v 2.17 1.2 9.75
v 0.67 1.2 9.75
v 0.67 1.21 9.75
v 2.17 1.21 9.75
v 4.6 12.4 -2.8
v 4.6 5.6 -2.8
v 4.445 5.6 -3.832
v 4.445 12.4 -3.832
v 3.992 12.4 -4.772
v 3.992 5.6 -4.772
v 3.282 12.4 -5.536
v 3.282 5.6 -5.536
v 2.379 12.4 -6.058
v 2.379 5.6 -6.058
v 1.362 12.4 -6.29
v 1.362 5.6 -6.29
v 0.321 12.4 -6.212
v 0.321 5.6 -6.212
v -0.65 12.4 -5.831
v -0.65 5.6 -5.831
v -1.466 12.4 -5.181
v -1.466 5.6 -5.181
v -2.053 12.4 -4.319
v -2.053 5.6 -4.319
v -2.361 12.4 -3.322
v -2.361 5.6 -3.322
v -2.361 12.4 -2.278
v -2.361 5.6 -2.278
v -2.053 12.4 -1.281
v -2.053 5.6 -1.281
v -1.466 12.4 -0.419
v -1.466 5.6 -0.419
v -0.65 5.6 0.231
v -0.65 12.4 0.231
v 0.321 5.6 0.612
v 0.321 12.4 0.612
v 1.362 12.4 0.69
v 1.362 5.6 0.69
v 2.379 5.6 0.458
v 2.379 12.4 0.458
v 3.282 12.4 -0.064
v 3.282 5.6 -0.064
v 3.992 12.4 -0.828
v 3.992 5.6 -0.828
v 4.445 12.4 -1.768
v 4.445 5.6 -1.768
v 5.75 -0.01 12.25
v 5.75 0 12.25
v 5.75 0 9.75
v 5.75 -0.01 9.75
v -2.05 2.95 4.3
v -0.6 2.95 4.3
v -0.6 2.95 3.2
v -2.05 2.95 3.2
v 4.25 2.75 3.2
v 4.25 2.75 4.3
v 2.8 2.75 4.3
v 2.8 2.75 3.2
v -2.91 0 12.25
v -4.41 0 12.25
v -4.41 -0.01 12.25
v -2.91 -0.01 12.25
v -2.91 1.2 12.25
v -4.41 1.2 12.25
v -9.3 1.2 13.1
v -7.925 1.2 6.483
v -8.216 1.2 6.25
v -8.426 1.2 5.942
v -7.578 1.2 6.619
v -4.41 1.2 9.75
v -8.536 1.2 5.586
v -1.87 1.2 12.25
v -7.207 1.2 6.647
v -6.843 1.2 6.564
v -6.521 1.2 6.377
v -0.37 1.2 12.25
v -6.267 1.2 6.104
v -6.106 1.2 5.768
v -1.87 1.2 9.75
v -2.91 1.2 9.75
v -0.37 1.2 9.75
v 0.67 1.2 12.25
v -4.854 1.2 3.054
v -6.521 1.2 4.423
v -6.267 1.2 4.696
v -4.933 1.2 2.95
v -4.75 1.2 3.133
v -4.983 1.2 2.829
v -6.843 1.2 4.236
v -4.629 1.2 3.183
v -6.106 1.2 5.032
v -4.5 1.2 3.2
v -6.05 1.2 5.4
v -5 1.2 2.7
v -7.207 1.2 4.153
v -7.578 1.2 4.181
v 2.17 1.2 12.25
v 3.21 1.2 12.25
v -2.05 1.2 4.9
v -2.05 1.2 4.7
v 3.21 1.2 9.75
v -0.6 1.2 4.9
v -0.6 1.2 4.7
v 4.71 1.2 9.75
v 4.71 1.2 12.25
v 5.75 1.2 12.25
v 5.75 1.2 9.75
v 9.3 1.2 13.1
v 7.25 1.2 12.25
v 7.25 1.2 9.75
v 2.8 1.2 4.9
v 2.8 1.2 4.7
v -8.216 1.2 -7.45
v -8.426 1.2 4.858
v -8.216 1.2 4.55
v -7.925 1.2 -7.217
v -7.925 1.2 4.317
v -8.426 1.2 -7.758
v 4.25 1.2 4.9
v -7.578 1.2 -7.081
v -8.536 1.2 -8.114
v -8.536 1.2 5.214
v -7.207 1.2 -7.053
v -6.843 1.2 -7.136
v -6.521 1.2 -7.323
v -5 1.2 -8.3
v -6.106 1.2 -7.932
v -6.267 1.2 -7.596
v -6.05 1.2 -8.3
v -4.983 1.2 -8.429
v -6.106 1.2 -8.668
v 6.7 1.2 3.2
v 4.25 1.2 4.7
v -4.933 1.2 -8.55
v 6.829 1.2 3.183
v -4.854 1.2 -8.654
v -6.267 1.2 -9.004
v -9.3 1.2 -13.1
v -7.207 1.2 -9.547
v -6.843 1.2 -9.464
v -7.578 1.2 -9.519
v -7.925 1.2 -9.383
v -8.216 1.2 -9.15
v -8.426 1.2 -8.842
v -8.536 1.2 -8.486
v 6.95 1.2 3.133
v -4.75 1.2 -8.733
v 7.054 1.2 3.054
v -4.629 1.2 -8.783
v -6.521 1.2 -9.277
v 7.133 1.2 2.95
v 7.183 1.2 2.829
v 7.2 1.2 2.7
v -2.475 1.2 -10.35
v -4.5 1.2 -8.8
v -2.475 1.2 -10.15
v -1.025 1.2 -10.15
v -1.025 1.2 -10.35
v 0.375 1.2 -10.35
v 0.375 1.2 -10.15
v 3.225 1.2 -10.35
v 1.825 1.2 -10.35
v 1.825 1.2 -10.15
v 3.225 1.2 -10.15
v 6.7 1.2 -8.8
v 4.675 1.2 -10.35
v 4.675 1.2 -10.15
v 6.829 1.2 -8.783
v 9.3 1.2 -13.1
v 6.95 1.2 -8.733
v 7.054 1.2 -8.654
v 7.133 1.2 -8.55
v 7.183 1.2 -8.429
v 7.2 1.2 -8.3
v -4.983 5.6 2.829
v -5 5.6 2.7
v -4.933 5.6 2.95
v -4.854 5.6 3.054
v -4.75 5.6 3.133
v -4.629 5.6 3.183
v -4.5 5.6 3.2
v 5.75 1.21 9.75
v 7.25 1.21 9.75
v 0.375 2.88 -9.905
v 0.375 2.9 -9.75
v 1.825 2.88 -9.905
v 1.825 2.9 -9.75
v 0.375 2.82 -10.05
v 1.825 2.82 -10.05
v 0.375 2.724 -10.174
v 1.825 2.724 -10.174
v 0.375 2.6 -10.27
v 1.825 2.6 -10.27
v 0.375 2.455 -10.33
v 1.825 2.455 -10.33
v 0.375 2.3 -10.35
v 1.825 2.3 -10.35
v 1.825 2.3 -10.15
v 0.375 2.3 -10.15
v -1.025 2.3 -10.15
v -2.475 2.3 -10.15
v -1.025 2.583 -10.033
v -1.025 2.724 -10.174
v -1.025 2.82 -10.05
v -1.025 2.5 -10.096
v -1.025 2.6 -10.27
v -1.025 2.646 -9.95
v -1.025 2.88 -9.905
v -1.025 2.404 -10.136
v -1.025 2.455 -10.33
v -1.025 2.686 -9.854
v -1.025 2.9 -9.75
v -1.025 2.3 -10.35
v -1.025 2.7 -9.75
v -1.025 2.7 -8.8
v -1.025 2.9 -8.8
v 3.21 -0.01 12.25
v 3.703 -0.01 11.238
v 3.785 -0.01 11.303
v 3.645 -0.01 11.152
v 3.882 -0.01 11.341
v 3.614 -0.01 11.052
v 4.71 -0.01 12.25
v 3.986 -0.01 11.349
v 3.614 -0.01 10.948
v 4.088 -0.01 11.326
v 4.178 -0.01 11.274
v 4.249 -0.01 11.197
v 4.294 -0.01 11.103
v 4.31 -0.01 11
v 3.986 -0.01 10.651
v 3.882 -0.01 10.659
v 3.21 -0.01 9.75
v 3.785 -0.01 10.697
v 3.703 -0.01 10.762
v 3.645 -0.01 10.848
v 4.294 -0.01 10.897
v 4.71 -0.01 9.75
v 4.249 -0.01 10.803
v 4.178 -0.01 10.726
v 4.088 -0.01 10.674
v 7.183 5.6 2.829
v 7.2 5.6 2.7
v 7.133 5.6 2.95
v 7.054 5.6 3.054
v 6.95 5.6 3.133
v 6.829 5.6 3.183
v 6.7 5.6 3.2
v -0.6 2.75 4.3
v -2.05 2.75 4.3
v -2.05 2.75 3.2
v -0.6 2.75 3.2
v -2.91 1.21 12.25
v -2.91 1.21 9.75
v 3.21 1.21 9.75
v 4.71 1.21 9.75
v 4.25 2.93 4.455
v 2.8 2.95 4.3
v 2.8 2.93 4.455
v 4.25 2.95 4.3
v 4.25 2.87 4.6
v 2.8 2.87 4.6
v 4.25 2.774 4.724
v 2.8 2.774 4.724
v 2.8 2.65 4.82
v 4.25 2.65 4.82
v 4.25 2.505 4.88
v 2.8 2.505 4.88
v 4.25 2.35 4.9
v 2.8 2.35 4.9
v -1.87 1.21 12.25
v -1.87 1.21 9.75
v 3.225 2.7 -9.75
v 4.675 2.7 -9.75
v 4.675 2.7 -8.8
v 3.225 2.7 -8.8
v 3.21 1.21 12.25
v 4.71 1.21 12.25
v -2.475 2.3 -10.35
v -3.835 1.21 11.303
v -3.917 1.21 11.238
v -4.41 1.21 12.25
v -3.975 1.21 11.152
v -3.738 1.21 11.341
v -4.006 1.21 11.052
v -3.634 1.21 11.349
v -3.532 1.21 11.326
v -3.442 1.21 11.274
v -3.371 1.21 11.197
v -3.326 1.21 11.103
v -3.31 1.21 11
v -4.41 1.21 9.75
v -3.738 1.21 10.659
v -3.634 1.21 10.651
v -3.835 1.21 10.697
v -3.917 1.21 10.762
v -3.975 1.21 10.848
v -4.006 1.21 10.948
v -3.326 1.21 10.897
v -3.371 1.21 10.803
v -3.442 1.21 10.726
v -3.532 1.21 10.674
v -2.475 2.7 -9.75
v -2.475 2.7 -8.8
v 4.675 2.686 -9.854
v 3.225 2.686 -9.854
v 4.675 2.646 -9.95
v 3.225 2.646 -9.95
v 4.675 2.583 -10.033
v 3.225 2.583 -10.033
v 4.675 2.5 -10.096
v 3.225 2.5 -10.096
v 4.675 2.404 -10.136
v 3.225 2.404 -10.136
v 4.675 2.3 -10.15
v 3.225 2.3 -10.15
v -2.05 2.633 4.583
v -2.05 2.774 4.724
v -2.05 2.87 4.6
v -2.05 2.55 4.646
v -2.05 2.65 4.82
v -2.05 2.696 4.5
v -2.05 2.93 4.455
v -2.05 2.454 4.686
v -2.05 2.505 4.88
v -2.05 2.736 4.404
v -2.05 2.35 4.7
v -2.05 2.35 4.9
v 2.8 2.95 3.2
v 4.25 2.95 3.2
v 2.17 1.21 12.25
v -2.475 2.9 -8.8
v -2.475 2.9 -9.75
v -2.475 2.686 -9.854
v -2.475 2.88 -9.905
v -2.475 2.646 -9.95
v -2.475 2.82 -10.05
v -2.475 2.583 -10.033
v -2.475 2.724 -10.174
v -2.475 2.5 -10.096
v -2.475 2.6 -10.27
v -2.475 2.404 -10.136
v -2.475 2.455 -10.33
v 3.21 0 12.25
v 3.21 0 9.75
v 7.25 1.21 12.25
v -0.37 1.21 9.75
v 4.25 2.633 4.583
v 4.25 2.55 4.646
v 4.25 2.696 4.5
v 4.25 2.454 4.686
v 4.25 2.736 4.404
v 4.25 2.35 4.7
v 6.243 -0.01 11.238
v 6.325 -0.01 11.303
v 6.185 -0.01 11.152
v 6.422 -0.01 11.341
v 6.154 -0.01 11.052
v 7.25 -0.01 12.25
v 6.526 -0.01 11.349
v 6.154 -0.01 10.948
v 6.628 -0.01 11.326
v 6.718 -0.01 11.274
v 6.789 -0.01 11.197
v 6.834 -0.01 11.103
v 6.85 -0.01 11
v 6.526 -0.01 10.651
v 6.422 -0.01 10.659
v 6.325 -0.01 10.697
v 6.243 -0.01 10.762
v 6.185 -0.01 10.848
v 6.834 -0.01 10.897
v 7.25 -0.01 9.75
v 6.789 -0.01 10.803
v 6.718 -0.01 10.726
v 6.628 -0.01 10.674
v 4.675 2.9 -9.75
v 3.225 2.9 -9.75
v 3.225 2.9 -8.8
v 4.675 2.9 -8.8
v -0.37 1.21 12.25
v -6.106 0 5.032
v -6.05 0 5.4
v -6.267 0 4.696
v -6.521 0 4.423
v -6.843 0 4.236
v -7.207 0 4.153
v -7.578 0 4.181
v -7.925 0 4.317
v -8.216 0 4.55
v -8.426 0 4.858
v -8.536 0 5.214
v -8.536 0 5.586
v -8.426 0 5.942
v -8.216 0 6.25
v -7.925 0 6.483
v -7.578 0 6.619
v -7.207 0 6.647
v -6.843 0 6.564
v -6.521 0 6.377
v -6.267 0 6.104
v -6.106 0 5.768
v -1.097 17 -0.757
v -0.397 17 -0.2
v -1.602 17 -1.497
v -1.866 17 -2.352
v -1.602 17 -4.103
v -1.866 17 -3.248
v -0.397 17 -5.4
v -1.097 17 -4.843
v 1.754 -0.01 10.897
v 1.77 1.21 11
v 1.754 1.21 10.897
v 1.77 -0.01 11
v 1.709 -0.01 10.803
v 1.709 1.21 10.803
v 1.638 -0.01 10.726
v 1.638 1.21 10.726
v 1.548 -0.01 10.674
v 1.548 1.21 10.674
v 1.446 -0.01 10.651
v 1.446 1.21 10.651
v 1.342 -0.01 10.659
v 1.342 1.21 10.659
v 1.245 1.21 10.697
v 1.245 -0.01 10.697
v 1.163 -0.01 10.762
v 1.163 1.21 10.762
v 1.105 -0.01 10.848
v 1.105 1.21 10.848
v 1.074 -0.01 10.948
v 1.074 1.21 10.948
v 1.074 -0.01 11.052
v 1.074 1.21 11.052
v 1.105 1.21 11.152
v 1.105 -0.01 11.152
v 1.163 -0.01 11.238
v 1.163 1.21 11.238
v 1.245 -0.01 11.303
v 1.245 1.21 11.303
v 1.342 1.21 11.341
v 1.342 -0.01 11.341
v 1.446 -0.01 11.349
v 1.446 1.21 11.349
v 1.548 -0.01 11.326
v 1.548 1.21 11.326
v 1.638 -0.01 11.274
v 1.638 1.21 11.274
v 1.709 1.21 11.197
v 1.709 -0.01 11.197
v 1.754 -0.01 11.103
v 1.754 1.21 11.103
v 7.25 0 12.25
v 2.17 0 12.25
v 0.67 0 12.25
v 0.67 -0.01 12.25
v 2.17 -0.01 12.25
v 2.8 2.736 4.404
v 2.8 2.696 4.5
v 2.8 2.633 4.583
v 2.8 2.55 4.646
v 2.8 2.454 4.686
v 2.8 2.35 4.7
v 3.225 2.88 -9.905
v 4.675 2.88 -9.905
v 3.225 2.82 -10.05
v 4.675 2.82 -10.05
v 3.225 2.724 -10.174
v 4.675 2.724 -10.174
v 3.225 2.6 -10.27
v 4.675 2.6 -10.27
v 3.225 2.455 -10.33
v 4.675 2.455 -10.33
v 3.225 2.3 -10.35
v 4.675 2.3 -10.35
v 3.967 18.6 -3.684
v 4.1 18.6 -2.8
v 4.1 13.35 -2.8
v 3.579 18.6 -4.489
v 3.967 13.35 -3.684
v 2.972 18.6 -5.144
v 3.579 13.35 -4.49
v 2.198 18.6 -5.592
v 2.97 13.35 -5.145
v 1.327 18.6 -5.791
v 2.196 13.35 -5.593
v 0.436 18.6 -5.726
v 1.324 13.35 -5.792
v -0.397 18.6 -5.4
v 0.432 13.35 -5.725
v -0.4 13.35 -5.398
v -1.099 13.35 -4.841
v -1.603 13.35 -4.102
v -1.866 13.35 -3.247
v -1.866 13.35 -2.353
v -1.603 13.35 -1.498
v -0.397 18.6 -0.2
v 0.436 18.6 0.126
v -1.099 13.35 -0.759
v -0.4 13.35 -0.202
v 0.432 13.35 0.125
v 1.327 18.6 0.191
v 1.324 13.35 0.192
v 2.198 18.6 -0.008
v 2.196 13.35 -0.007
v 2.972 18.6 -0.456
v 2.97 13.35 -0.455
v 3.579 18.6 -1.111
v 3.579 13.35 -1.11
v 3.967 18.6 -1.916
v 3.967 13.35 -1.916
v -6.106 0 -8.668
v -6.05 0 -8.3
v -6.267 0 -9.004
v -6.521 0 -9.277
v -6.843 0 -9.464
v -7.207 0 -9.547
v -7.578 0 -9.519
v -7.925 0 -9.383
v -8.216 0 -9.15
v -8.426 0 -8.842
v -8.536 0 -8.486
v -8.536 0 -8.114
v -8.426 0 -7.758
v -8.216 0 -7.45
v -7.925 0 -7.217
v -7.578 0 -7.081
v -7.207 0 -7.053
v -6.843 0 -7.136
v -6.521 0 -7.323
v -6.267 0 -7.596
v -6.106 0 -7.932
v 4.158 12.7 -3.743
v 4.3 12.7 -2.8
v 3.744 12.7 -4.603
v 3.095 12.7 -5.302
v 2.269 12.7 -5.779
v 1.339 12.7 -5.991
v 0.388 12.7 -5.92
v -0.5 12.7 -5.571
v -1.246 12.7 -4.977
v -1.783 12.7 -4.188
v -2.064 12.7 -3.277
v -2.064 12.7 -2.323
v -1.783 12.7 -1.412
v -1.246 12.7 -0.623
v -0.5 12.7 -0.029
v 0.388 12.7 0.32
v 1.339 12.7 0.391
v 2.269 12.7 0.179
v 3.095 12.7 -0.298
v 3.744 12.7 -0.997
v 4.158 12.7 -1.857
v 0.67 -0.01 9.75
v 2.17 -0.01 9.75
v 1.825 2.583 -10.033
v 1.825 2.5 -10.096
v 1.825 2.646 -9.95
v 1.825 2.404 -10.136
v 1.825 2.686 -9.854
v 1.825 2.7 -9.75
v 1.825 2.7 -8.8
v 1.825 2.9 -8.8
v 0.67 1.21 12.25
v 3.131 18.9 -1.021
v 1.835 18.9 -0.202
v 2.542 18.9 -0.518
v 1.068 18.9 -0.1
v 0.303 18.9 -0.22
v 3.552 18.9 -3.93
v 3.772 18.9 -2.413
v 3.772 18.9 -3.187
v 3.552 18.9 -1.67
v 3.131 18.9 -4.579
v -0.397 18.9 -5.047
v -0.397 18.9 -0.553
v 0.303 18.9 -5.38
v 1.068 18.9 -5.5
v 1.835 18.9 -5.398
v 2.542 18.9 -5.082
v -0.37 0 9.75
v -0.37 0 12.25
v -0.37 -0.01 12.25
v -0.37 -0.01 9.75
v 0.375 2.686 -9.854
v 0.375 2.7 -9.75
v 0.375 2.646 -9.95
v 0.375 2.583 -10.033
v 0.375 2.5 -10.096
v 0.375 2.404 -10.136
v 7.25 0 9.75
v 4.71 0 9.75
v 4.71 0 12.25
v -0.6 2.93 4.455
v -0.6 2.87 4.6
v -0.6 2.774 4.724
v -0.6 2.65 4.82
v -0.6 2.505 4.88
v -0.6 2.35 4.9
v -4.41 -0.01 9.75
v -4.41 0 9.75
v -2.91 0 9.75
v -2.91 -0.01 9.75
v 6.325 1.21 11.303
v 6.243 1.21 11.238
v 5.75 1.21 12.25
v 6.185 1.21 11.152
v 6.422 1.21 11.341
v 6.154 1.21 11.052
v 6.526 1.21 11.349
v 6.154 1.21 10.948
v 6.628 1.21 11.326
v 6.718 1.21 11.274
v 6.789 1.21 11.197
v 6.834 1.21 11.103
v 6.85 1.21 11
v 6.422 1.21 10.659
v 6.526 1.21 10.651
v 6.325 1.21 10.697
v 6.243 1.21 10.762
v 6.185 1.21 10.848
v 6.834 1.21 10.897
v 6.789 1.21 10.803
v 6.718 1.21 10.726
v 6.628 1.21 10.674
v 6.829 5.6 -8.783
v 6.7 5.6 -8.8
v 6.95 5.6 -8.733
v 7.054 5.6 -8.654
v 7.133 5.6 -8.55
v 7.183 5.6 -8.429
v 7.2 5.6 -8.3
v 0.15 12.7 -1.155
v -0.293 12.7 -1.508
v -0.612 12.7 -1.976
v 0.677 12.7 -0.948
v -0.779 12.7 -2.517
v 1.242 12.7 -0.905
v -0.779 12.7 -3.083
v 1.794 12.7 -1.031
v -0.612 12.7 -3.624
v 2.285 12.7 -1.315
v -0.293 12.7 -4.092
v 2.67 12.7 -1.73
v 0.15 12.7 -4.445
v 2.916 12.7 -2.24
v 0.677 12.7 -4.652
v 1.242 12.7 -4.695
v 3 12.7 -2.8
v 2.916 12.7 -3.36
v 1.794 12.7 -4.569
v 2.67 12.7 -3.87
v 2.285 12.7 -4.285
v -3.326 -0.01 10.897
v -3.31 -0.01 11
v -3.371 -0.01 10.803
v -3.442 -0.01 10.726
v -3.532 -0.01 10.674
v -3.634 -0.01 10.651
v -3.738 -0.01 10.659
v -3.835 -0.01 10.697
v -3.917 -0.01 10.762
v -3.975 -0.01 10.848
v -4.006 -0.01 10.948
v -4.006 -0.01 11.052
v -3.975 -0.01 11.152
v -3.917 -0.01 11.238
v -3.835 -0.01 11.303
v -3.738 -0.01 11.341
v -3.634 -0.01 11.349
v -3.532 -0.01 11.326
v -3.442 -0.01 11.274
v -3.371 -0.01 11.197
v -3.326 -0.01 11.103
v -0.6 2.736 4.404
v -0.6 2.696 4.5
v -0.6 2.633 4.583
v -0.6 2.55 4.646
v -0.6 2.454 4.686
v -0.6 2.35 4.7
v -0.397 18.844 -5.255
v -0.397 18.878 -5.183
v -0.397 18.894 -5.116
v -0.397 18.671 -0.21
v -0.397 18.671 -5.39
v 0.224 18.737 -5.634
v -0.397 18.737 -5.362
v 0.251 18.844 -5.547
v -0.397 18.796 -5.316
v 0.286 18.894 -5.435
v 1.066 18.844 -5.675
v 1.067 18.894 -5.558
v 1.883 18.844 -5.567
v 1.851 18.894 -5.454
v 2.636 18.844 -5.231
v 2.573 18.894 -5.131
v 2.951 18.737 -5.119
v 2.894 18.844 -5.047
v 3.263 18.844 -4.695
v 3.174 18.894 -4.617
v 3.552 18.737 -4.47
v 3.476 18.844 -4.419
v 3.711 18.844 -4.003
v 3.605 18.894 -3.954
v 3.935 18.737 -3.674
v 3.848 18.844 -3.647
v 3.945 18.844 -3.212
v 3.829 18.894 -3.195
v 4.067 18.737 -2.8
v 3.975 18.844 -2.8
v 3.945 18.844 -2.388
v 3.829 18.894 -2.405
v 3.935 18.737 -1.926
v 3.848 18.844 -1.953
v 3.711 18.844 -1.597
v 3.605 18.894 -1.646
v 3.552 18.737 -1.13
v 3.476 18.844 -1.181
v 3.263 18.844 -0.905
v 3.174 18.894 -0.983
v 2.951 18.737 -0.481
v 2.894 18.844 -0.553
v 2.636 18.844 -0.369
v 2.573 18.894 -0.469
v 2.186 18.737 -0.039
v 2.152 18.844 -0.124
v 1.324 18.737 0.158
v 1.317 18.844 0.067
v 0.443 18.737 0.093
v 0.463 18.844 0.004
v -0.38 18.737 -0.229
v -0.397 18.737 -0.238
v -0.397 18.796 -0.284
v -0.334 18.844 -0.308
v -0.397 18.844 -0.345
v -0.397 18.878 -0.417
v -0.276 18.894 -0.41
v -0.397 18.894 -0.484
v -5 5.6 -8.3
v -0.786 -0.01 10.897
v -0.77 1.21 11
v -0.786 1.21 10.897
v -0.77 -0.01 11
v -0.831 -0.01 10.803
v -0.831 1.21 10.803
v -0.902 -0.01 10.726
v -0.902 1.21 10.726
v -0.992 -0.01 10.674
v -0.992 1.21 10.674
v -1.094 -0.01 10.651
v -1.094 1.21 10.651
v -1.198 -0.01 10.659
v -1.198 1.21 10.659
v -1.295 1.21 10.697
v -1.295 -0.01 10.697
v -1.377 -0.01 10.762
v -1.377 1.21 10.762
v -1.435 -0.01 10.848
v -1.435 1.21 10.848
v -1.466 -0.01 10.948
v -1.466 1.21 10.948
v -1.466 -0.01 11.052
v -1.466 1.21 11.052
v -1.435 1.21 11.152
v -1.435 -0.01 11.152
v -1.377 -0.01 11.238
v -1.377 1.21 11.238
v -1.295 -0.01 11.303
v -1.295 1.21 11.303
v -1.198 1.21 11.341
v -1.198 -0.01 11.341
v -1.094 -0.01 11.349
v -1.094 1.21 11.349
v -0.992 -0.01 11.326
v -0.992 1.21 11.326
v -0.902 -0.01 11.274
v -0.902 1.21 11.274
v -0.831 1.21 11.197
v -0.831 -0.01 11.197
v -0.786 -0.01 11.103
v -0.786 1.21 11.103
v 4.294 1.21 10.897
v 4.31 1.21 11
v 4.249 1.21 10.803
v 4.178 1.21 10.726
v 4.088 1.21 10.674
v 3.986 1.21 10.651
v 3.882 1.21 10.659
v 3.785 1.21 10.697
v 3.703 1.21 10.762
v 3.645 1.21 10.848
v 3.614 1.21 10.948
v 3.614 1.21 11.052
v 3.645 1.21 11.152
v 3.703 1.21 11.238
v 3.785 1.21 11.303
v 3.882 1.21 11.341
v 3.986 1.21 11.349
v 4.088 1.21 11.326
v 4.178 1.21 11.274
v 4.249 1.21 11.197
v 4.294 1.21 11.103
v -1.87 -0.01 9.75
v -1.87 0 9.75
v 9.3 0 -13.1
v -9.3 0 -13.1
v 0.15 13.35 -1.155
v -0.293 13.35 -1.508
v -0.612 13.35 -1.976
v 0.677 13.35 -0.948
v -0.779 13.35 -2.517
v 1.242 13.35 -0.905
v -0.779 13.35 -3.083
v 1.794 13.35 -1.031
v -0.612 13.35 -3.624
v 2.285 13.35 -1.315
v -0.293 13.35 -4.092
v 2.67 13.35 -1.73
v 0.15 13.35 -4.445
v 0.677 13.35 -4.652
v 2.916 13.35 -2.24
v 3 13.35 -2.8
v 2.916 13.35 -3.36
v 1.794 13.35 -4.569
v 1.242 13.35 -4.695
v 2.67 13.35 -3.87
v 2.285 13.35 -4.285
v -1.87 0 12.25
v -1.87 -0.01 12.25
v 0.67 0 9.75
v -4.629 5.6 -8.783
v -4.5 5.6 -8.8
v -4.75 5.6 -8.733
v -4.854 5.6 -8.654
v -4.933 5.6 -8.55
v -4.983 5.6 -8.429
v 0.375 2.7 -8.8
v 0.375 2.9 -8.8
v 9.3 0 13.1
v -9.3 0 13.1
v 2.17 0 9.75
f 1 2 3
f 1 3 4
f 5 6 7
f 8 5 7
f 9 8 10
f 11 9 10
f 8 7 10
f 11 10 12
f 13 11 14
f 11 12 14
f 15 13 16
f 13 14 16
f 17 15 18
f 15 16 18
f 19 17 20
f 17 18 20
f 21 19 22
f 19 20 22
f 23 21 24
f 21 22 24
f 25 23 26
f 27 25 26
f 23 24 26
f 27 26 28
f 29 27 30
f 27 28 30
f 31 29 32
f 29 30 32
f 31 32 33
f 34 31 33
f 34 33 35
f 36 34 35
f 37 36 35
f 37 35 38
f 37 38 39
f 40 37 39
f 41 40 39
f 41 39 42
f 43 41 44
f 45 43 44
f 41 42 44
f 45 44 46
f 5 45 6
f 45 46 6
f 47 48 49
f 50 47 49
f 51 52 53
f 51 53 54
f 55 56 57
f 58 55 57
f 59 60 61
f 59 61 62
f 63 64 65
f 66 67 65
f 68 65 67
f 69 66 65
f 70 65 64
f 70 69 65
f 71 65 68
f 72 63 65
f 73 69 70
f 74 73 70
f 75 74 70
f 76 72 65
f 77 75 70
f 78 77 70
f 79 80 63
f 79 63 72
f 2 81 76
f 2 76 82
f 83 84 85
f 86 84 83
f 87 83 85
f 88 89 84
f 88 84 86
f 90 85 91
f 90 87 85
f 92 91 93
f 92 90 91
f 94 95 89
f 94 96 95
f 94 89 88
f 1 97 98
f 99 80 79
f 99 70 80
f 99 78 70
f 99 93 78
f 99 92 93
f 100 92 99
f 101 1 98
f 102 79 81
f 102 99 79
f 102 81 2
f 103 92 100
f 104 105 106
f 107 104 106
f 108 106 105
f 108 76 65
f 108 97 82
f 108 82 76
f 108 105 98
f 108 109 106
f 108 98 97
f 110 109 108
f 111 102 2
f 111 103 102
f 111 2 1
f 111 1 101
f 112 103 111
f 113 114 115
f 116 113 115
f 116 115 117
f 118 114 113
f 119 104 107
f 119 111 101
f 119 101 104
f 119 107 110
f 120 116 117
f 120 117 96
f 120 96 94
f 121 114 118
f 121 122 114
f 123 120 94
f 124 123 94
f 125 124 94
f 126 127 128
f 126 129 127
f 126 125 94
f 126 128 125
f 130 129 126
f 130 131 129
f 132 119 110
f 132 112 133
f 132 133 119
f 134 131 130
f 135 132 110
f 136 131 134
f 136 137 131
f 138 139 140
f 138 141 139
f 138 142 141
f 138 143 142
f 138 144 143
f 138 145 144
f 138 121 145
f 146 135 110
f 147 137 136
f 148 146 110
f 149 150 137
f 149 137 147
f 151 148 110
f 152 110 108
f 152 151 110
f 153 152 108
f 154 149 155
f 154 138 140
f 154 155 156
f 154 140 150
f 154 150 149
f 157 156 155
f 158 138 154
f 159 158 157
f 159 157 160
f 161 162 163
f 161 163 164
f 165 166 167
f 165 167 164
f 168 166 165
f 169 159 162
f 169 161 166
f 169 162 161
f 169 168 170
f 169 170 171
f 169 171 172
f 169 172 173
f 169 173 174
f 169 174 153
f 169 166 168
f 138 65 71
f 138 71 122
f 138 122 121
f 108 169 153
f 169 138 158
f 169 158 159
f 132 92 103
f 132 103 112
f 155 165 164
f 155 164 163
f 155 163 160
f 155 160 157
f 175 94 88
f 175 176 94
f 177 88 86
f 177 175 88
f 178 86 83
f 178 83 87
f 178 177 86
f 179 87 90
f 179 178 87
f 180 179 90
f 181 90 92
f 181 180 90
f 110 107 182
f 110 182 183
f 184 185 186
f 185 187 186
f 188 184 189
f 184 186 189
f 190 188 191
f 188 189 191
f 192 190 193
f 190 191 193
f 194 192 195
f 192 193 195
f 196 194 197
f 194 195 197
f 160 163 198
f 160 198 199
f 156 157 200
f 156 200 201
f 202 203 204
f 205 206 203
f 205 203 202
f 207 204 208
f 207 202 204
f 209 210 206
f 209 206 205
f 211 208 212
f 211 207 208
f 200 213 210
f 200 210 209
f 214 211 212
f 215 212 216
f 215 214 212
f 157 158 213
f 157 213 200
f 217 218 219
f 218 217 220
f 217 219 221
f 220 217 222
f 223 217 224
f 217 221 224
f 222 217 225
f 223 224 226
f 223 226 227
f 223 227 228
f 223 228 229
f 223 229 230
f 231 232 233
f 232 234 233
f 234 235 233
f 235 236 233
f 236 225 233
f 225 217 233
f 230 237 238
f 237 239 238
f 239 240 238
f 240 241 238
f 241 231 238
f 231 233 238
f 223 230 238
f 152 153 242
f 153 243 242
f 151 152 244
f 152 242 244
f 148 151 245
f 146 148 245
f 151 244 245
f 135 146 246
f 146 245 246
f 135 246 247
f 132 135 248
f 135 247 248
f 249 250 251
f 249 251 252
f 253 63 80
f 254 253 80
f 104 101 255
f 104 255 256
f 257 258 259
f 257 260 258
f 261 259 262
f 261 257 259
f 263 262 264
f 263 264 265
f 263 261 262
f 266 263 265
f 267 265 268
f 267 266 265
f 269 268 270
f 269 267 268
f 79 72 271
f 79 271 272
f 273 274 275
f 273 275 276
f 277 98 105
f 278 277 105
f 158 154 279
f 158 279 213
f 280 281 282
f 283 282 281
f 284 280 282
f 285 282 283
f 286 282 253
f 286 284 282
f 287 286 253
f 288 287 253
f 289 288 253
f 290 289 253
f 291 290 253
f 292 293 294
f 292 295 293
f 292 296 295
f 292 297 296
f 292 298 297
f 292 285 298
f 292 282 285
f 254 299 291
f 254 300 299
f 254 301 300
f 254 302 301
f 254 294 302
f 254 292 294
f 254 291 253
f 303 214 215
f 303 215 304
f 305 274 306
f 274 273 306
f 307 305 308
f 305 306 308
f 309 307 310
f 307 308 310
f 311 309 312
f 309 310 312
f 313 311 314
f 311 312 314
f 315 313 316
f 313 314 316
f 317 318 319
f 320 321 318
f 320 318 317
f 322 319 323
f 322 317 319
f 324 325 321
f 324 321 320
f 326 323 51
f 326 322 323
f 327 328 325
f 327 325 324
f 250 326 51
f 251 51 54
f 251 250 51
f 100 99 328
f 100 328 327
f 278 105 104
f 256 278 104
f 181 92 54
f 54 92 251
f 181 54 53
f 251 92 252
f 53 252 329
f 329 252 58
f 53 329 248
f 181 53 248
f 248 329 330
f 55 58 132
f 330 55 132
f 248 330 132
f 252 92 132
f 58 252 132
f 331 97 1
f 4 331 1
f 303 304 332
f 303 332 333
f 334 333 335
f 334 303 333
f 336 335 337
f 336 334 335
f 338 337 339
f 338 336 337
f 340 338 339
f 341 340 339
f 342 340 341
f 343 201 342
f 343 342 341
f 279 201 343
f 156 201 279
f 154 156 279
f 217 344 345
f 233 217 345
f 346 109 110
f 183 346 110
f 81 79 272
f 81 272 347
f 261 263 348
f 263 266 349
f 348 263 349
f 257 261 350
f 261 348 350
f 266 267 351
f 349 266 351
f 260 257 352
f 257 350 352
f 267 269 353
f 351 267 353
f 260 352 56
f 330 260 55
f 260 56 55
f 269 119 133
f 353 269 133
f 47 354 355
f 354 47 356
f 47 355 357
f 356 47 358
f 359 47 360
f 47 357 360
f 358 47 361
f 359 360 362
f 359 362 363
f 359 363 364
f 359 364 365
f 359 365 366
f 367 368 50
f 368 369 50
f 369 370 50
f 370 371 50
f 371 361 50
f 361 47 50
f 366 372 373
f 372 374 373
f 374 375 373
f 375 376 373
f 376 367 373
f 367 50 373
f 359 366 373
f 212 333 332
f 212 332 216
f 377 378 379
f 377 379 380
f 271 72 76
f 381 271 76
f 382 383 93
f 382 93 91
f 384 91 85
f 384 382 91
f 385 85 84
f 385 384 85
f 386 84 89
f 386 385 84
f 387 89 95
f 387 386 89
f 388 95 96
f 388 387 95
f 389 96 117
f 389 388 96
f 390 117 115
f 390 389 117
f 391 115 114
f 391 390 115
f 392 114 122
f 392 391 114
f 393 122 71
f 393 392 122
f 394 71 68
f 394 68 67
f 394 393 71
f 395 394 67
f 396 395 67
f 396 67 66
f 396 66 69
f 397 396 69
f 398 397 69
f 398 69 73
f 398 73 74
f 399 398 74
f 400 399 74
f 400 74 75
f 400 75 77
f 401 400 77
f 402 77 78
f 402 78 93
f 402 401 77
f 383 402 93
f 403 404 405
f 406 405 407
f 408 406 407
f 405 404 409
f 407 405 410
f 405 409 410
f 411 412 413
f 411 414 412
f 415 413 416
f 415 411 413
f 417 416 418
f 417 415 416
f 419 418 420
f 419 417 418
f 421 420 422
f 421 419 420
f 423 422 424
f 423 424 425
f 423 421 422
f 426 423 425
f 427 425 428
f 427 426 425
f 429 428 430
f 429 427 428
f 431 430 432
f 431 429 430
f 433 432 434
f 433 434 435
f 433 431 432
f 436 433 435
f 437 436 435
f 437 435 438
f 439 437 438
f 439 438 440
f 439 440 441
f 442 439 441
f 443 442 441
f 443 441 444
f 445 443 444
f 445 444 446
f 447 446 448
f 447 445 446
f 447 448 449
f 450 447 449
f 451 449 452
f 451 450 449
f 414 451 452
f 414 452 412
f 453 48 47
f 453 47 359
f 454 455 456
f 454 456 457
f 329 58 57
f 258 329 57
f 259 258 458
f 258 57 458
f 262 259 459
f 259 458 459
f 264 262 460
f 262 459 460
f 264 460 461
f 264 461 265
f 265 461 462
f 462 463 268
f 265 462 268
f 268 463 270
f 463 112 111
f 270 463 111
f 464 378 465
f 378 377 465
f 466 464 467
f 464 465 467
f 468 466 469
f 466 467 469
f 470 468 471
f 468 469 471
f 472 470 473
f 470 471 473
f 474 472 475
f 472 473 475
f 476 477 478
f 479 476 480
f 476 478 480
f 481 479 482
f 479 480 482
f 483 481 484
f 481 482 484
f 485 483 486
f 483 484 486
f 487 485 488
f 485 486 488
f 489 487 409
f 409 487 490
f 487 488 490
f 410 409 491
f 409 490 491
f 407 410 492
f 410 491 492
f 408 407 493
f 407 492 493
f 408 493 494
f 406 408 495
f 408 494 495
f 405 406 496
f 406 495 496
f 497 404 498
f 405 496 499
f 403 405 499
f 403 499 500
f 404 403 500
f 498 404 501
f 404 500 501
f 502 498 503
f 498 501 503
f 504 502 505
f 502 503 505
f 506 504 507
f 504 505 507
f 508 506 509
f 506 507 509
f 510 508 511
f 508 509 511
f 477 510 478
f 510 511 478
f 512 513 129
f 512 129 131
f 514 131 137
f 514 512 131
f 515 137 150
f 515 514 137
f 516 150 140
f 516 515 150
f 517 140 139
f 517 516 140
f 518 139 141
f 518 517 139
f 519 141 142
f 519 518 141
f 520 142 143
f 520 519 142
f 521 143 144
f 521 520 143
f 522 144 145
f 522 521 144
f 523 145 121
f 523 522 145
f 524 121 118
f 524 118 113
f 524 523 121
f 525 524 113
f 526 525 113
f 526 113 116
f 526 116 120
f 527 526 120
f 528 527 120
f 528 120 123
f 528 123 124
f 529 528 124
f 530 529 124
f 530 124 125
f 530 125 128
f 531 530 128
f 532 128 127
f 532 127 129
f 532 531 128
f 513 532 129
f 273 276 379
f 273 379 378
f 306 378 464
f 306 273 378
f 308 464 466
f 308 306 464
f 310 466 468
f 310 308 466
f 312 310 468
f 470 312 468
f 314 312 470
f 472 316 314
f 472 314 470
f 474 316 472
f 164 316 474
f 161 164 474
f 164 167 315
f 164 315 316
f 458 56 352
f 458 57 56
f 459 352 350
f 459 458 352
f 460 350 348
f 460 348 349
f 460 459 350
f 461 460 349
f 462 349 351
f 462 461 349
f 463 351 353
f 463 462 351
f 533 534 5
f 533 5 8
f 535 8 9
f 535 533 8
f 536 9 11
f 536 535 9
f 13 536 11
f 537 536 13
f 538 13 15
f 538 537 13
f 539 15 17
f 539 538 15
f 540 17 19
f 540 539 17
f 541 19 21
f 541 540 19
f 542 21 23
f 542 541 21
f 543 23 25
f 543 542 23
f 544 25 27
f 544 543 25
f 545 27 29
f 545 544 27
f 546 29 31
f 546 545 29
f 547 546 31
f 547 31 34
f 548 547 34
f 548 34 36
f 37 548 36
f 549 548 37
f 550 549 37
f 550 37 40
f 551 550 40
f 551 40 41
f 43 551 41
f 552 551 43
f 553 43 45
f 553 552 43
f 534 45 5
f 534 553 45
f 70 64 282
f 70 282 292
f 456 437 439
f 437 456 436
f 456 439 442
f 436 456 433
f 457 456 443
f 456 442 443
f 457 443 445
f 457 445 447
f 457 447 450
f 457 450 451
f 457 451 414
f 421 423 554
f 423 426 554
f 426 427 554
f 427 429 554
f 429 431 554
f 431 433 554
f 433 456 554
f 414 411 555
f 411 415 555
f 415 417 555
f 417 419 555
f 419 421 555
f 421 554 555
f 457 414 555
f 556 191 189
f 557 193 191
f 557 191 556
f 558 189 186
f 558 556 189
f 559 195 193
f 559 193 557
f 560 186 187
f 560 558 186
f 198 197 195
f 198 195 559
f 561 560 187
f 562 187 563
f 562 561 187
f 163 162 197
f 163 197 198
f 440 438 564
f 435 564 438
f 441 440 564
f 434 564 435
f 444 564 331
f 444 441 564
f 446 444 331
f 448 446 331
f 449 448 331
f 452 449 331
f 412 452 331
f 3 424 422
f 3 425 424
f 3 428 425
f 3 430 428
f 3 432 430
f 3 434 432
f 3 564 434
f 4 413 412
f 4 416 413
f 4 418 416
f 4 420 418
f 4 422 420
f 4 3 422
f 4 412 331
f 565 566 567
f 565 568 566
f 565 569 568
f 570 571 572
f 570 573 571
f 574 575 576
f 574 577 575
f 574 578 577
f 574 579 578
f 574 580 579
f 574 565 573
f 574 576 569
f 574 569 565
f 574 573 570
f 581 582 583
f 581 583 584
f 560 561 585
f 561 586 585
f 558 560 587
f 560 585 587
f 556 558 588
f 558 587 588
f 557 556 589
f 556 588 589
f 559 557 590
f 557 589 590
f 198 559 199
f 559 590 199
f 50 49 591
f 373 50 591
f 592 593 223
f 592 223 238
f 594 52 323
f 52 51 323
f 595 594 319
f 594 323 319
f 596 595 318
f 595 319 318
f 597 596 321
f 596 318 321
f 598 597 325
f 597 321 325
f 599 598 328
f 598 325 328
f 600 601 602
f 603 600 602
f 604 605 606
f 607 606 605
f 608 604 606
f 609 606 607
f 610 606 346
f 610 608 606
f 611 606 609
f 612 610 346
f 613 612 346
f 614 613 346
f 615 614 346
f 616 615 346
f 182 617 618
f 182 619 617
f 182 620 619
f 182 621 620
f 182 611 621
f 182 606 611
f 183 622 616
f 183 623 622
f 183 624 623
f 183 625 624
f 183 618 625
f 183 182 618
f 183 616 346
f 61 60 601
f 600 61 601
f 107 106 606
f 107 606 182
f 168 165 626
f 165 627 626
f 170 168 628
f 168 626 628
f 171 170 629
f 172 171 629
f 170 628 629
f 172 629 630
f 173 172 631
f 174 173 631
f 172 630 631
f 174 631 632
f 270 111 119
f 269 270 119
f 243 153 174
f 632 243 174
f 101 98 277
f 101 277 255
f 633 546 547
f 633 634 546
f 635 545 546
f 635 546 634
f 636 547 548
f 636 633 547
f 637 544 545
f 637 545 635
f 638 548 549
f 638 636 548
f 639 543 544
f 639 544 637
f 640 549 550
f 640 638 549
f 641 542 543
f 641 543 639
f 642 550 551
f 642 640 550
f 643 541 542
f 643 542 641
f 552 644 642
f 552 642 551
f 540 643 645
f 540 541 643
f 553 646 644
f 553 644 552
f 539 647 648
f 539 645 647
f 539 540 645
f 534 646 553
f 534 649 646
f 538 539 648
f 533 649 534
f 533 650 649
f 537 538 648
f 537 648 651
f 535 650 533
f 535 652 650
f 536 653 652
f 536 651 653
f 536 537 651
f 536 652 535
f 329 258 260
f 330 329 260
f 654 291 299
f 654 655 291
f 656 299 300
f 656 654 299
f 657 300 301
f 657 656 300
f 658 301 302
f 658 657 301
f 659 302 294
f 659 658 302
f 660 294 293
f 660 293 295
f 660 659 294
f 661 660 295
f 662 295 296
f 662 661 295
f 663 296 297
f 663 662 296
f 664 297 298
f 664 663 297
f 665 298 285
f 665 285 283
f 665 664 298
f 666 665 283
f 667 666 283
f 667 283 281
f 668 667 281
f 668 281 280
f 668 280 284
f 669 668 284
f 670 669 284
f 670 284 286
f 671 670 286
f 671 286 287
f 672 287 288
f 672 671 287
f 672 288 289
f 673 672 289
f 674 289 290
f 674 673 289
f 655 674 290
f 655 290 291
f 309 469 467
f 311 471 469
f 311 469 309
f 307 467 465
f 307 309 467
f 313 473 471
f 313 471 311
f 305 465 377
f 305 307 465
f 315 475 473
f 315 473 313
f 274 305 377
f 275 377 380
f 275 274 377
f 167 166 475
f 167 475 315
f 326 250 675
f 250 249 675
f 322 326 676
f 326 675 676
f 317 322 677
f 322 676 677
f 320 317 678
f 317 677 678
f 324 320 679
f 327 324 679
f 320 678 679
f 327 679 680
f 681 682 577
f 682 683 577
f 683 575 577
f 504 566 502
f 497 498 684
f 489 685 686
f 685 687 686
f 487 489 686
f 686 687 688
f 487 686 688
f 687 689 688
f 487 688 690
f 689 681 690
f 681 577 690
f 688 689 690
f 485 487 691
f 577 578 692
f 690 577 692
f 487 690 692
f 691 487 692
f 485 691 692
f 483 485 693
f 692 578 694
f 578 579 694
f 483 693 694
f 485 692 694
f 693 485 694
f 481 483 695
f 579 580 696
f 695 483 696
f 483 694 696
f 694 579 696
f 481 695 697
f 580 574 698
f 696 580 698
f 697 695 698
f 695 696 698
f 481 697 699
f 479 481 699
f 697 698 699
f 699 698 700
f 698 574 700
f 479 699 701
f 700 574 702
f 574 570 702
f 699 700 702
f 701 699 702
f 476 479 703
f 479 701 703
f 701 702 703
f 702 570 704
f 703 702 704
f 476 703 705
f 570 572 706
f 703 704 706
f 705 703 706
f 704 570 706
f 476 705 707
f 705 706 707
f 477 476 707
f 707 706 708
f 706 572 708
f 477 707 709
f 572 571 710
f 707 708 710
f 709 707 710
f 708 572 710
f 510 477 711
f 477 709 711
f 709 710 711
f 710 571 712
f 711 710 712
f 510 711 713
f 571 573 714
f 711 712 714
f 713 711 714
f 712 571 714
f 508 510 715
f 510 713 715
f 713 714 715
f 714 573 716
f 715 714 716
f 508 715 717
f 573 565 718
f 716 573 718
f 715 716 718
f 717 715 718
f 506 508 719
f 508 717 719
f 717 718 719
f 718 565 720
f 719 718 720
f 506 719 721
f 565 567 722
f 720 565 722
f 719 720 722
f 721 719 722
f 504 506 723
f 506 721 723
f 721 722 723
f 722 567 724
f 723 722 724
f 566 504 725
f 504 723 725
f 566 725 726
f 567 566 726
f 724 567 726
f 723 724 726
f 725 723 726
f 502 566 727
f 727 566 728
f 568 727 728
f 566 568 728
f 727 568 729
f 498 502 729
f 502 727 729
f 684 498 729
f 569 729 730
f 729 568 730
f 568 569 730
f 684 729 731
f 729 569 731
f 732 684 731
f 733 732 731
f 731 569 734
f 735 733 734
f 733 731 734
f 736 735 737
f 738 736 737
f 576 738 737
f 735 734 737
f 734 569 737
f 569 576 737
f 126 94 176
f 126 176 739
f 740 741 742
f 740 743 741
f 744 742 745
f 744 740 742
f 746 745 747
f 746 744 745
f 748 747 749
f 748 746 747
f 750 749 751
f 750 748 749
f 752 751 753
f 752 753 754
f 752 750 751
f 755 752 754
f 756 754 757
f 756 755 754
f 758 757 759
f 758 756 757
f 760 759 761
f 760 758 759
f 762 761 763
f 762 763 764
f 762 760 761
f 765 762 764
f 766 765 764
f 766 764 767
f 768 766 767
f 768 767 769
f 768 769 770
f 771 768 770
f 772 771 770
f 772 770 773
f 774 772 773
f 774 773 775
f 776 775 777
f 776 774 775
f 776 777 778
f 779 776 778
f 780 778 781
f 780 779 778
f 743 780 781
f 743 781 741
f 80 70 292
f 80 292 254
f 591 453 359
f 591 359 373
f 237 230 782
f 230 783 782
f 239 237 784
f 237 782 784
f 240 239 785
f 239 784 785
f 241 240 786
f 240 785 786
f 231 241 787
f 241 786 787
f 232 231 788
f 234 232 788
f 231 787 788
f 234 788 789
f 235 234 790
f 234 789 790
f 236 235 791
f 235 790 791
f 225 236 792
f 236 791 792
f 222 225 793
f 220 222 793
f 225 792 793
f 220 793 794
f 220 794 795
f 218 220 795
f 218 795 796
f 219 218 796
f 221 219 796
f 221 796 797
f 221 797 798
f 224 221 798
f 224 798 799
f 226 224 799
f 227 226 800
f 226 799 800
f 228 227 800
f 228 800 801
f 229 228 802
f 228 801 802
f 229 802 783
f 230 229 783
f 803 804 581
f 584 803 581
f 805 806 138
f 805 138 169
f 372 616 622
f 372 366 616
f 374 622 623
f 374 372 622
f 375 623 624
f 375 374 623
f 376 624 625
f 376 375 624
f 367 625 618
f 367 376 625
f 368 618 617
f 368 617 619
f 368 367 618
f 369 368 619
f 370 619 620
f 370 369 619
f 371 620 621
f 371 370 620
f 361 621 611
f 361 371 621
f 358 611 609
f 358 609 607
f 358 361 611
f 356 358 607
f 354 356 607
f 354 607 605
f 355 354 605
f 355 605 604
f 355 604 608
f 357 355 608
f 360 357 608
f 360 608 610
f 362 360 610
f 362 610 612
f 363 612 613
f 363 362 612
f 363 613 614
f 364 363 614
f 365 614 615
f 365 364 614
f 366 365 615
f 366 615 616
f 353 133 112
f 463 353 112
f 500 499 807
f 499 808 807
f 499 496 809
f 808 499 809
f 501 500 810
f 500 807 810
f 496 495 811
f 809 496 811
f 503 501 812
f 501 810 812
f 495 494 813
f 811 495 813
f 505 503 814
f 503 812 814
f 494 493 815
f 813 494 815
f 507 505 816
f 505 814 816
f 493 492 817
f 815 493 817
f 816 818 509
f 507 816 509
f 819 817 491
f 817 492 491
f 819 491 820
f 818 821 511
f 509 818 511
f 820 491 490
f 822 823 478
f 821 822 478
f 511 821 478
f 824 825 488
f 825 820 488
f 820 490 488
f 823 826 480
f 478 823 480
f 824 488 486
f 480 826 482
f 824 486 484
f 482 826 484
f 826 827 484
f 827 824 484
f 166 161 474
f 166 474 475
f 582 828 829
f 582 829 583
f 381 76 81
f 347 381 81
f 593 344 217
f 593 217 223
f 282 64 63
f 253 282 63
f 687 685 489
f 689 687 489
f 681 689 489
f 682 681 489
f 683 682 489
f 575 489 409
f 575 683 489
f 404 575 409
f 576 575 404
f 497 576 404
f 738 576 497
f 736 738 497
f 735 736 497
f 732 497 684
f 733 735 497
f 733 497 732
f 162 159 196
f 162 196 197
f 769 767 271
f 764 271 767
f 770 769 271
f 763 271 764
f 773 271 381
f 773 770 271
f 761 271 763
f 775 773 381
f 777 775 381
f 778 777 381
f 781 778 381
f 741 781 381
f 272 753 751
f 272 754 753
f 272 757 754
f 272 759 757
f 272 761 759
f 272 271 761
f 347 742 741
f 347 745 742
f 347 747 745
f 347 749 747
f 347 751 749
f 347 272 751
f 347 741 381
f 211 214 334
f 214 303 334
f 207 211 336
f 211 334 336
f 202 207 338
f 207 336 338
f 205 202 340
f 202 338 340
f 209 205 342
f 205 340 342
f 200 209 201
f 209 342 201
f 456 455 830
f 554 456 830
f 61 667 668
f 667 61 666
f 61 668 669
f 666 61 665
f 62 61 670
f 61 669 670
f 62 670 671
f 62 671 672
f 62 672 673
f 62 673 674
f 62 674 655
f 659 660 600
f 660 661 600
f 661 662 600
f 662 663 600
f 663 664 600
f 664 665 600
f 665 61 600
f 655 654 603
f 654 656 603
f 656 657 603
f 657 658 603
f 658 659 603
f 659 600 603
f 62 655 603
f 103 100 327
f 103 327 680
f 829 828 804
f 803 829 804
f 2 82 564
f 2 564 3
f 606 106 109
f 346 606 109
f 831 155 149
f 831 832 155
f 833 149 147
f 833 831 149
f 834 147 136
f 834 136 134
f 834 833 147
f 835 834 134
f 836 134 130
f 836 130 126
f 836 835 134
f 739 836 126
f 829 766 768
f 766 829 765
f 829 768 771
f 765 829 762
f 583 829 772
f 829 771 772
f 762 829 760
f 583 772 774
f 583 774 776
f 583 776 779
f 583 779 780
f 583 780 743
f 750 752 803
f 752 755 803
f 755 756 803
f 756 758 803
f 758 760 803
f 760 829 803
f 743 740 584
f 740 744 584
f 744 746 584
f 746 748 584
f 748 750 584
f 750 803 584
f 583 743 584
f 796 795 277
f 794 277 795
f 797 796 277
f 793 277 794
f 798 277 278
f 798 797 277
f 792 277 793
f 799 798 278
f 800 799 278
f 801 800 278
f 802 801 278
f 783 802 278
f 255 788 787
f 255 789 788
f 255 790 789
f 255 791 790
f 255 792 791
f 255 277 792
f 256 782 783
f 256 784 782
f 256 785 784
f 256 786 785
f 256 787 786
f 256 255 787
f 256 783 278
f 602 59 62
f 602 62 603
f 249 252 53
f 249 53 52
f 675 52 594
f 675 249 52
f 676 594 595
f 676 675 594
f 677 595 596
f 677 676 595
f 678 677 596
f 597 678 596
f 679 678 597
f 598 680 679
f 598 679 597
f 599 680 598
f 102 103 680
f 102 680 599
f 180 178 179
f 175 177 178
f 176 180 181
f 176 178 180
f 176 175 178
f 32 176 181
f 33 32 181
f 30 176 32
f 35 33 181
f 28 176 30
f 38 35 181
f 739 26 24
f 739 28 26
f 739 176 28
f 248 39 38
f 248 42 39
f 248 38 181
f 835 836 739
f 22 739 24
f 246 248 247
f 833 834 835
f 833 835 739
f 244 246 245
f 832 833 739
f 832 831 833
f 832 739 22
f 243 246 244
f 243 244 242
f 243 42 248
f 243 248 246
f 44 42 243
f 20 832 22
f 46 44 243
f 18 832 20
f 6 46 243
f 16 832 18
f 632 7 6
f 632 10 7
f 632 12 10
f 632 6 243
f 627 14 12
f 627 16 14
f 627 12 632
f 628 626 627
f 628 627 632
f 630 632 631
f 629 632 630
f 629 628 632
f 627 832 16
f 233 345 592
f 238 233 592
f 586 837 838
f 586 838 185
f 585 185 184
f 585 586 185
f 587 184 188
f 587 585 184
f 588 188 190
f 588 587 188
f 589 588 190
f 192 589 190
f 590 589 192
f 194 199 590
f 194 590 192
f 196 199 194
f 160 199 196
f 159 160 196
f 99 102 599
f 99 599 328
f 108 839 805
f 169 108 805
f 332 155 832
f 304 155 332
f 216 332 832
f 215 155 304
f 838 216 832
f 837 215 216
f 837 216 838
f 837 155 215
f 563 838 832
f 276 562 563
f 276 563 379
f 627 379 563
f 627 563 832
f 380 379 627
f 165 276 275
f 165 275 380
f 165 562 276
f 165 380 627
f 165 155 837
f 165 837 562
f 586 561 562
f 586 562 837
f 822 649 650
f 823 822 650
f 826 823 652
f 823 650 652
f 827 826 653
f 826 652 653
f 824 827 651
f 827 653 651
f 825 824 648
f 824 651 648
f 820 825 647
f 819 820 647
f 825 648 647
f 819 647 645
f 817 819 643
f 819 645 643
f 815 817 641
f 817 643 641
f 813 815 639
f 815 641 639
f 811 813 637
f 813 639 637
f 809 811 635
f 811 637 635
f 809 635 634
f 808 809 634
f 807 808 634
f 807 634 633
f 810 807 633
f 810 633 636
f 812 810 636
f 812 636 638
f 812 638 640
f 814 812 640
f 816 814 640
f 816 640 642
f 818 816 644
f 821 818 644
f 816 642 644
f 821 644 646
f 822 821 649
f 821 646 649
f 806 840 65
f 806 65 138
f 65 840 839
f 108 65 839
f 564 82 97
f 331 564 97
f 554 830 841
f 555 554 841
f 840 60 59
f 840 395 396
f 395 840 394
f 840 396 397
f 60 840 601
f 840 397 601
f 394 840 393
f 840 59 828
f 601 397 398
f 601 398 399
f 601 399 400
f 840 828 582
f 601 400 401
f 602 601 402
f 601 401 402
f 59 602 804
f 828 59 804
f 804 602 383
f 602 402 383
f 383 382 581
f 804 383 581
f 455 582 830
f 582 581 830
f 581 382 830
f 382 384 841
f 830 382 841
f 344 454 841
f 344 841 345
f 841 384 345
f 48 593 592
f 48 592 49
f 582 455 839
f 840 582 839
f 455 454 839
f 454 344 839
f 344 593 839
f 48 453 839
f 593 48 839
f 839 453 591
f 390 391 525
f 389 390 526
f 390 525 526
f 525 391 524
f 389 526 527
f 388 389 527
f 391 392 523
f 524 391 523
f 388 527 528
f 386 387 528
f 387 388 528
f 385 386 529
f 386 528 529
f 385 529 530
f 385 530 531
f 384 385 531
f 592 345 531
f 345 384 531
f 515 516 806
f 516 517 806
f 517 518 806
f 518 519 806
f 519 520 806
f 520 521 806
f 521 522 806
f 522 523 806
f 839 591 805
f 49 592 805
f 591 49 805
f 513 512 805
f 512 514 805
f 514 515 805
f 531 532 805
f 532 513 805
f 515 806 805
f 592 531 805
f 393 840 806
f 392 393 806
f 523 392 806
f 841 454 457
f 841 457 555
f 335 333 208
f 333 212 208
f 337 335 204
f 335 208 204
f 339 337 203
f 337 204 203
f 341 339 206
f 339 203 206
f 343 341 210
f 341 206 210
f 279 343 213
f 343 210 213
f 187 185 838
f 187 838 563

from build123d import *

# Parameters (mm, degrees)
SKETCH1_W             = 18.6
SKETCH1_H             = 26.2
SKETCH1_R             = 1.25
BOSS_EXTRUDE1_DEPTH   = 1.2
SKETCH3_W             = 12.2
SKETCH3_H             = 12
BOSS_EXTRUDE2_DEPTH   = 4.4
SKETCH10_W            = 1.45
SKETCH10_H            = 0.2
SKETCH13_W            = 1.45
SKETCH13_H            = 0.2
LPATTERN1_COUNT       = 2
LPATTERN1_PITCH       = 2.85
LPATTERN2_COUNT       = 2
LPATTERN2_PITCH       = 2.85
SKETCH14_R            = 3.5
BOSS_EXTRUDE4_DEPTH   = 7.1
CHAMFER1_SIZE         = 0.3
SKETCH15_R            = 1.9
BOSS_EXTRUDE5_DEPTH   = 0.65
SKETCH16_R            = 3
BOSS_EXTRUDE6_DEPTH   = 14.45
CHAMFER2_SIZE         = 0.6
CUT_EXTRUDE1_DEPTH    = 10.8
SKETCH18_R            = 0.35
CUT_EXTRUDE2_DEPTH    = 1.2
SKETCH19_W            = 1.5
SKETCH19_H            = 2.5
SKETCH19_R            = 0.35
BOSS_EXTRUDE7_DEPTH   = 0.01
FILLET1_R             = 0.5
CROQUIS1_R            = 3.5
CORTAR_EXTRUIR1_DEPTH = 8.9
REDONDEO1_R           = 0.3


with BuildPart() as part:
    # Sketch1 → Boss-Extrude1 (new body)
    with BuildSketch(Plane(origin=(0, 0, 0), x_dir=(1, 0, 0), z_dir=(0, 1, 0))):
        Rectangle(SKETCH1_W, SKETCH1_H)
        with Locations((-7.3, 8.3)):
            Circle(SKETCH1_R, mode=Mode.SUBTRACT)
        with Locations((-7.3, -5.4)):
            Circle(SKETCH1_R, mode=Mode.SUBTRACT)
    extrude(amount=BOSS_EXTRUDE1_DEPTH)

    # Sketch3 → Boss-Extrude2 (add)
    with BuildSketch(Plane(origin=(0, 1.2, 0), x_dir=(1, 0, 0), z_dir=(0, 1, 0))):
        with Locations((1.1, 2.8)):
            Rectangle(SKETCH3_W, SKETCH3_H)
    extrude(amount=BOSS_EXTRUDE2_DEPTH)

    # Sweep3: sweep along a curve in space
    with BuildLine() as sweep3_path:
        Line((-1.325, 2.85, 3.2), (-1.325, 2.85, 4.3))
        ThreePointArc((-1.325, 2.85, 4.3), (-1.325, 2.703553391, 4.653553391), (-1.325, 2.35, 4.8))
        Line((-1.325, 2.35, 4.8), (-1.325, 1.2, 4.8))
    # Sketch10 → Sweep3 (sweep)
    with BuildSketch(Plane.XY.offset(3.2)):
        with Locations((-1.325, 2.85)):
            Rectangle(SKETCH10_W, SKETCH10_H)
    sweep3 = sweep(path=sweep3_path.line)

    # Mirror2: Sweep3 across plane
    add(sweep3.mirror(Plane.ZY.offset(-1.1)))

    # Sweep4: sweep along a curve in space
    with BuildLine() as sweep4_path:
        Line((1.1, 2.8, -8.8), (1.1, 2.8, -9.75))
        ThreePointArc((1.1, 2.8, -9.75), (1.1, 2.653553391, -10.103553391), (1.1, 2.3, -10.25))
        Line((1.1, 2.3, -10.25), (1.1, 1.2, -10.25))
    # Sketch13 → Sweep4 (sweep)
    with BuildSketch(Plane(origin=(0, 0, -8.8), x_dir=(-1, 0, 0), z_dir=(0, 0, -1))):
        with Locations((-1.1, 2.8)):
            Rectangle(SKETCH13_W, SKETCH13_H)
    sweep4 = sweep(path=sweep4_path.line)

    # LPattern1: Sweep4 ×2
    with Locations(*[(-i * LPATTERN1_PITCH, 0, 0) for i in range(1, LPATTERN1_COUNT)]):
        add(sweep4)

    # LPattern2: Sweep4 ×2
    with Locations(*[(i * LPATTERN2_PITCH, 0, 0) for i in range(1, LPATTERN2_COUNT)]):
        add(sweep4)

    # Sketch14 → Boss-Extrude4 (add)
    with BuildSketch(Plane(origin=(0, 5.6, 0), x_dir=(1, 0, 0), z_dir=(0, 1, 0))):
        with Locations((1.1, 2.8)):
            Circle(SKETCH14_R)
    extrude(amount=BOSS_EXTRUDE4_DEPTH)

    # Chamfer1
    chamfer1_edges = [part.edges().sort_by_distance(p)[0] for p in [
        (-2.4, 12.7, -2.8),
    ]]
    chamfer(chamfer1_edges, length=CHAMFER1_SIZE)

    # Sketch15 → Boss-Extrude5 (add)
    with BuildSketch(Plane(origin=(0, 12.7, 0), x_dir=(1, 0, 0), z_dir=(0, 1, 0))):
        with Locations((1.1, 2.8)):
            Circle(SKETCH15_R)
    extrude(amount=BOSS_EXTRUDE5_DEPTH)

    # Sketch16 → Boss-Extrude6 (add)
    with BuildSketch(Plane(origin=(0, 13.35, 0), x_dir=(1, 0, 0), z_dir=(0, 1, 0))):
        with Locations((1.1, 2.8)):
            Circle(SKETCH16_R)
    extrude(amount=BOSS_EXTRUDE6_DEPTH)

    # Chamfer2
    chamfer2_edges = [part.edges().sort_by_distance(p)[0] for p in [
        (-1.9, 27.8, -2.8),
    ]]
    chamfer(chamfer2_edges, length=CHAMFER2_SIZE)

    # Sketch17 → Cut-Extrude1 (cut)
    with BuildSketch(Plane(origin=(0, 27.8, 0), x_dir=(1, 0, 0), z_dir=(0, 1, 0))):
        with BuildLine():
            Line((-0.396662955, 5.4), (-0.396662955, 0.2))
            ThreePointArc((-0.396662955, 0.2), (-1.9, 2.8), (-0.396662955, 5.4))
        make_face()
    extrude(amount=-CUT_EXTRUDE1_DEPTH, mode=Mode.SUBTRACT)

    # Sketch18 → Cut-Extrude2 (cut)
    with BuildSketch(Plane(origin=(0, 1.2, 0), x_dir=(1, 0, 0), z_dir=(0, 1, 0))):
        with Locations((6.5, -11)):
            Circle(SKETCH18_R)
        with Locations((3.96, -11)):
            Circle(SKETCH18_R)
        with Locations((1.42, -11)):
            Circle(SKETCH18_R)
        with Locations((-1.12, -11)):
            Circle(SKETCH18_R)
        with Locations((-3.66, -11)):
            Circle(SKETCH18_R)
    extrude(amount=-CUT_EXTRUDE2_DEPTH, mode=Mode.SUBTRACT)

    # Sketch19 → Boss-Extrude7 (add)
    with BuildSketch(Plane(origin=(0, 1.2, 0), x_dir=(1, 0, 0), z_dir=(0, 1, 0))):
        with Locations((3.96, -11)):
            Rectangle(SKETCH19_W, SKETCH19_H)
        with Locations((3.96, -11)):
            Circle(SKETCH19_R, mode=Mode.SUBTRACT)
        with Locations((6.5, -11)):
            Rectangle(SKETCH19_W, SKETCH19_H)
        with Locations((6.5, -11)):
            Circle(SKETCH19_R, mode=Mode.SUBTRACT)
        with Locations((1.42, -11)):
            Rectangle(SKETCH19_W, SKETCH19_H)
        with Locations((1.42, -11)):
            Circle(SKETCH19_R, mode=Mode.SUBTRACT)
        with Locations((-1.12, -11)):
            Rectangle(SKETCH19_W, SKETCH19_H)
        with Locations((-1.12, -11)):
            Circle(SKETCH19_R, mode=Mode.SUBTRACT)
        with Locations((-3.66, -11)):
            Rectangle(SKETCH19_W, SKETCH19_H)
        with Locations((-3.66, -11)):
            Circle(SKETCH19_R, mode=Mode.SUBTRACT)
    boss_extrude7 = extrude(amount=BOSS_EXTRUDE7_DEPTH)

    # Mirror3: Boss-Extrude7 across plane
    add(boss_extrude7.mirror(Plane.ZX.offset(0.6)))

    # Fillet1
    fillet1_edges = [part.edges().sort_by_distance(p)[0] for p in [
        (7.2, 3.4, 3.2),
        (7.2, 3.4, -8.8),
        (-5, 3.4, -8.8),
        (-5, 3.4, 3.2),
    ]]
    fillet(fillet1_edges, radius=FILLET1_R)

    # Croquis1 → Cortar-Extruir1 (cut)
    with BuildSketch(Plane(origin=(0, 27.8, 0), x_dir=(1, 0, 0), z_dir=(0, 1, 0))):
        with Locations((1.1, 2.8)):
            Circle(CROQUIS1_R)
    extrude(amount=-CORTAR_EXTRUIR1_DEPTH, mode=Mode.SUBTRACT)

    # Redondeo1
    redondeo1_edges = [part.edges().sort_by_distance(p)[0] for p in [
        (2.601667596, 18.9, -5.397112711),
    ]]
    fillet(redondeo1_edges, radius=REDONDEO1_R)


solid = part.part
